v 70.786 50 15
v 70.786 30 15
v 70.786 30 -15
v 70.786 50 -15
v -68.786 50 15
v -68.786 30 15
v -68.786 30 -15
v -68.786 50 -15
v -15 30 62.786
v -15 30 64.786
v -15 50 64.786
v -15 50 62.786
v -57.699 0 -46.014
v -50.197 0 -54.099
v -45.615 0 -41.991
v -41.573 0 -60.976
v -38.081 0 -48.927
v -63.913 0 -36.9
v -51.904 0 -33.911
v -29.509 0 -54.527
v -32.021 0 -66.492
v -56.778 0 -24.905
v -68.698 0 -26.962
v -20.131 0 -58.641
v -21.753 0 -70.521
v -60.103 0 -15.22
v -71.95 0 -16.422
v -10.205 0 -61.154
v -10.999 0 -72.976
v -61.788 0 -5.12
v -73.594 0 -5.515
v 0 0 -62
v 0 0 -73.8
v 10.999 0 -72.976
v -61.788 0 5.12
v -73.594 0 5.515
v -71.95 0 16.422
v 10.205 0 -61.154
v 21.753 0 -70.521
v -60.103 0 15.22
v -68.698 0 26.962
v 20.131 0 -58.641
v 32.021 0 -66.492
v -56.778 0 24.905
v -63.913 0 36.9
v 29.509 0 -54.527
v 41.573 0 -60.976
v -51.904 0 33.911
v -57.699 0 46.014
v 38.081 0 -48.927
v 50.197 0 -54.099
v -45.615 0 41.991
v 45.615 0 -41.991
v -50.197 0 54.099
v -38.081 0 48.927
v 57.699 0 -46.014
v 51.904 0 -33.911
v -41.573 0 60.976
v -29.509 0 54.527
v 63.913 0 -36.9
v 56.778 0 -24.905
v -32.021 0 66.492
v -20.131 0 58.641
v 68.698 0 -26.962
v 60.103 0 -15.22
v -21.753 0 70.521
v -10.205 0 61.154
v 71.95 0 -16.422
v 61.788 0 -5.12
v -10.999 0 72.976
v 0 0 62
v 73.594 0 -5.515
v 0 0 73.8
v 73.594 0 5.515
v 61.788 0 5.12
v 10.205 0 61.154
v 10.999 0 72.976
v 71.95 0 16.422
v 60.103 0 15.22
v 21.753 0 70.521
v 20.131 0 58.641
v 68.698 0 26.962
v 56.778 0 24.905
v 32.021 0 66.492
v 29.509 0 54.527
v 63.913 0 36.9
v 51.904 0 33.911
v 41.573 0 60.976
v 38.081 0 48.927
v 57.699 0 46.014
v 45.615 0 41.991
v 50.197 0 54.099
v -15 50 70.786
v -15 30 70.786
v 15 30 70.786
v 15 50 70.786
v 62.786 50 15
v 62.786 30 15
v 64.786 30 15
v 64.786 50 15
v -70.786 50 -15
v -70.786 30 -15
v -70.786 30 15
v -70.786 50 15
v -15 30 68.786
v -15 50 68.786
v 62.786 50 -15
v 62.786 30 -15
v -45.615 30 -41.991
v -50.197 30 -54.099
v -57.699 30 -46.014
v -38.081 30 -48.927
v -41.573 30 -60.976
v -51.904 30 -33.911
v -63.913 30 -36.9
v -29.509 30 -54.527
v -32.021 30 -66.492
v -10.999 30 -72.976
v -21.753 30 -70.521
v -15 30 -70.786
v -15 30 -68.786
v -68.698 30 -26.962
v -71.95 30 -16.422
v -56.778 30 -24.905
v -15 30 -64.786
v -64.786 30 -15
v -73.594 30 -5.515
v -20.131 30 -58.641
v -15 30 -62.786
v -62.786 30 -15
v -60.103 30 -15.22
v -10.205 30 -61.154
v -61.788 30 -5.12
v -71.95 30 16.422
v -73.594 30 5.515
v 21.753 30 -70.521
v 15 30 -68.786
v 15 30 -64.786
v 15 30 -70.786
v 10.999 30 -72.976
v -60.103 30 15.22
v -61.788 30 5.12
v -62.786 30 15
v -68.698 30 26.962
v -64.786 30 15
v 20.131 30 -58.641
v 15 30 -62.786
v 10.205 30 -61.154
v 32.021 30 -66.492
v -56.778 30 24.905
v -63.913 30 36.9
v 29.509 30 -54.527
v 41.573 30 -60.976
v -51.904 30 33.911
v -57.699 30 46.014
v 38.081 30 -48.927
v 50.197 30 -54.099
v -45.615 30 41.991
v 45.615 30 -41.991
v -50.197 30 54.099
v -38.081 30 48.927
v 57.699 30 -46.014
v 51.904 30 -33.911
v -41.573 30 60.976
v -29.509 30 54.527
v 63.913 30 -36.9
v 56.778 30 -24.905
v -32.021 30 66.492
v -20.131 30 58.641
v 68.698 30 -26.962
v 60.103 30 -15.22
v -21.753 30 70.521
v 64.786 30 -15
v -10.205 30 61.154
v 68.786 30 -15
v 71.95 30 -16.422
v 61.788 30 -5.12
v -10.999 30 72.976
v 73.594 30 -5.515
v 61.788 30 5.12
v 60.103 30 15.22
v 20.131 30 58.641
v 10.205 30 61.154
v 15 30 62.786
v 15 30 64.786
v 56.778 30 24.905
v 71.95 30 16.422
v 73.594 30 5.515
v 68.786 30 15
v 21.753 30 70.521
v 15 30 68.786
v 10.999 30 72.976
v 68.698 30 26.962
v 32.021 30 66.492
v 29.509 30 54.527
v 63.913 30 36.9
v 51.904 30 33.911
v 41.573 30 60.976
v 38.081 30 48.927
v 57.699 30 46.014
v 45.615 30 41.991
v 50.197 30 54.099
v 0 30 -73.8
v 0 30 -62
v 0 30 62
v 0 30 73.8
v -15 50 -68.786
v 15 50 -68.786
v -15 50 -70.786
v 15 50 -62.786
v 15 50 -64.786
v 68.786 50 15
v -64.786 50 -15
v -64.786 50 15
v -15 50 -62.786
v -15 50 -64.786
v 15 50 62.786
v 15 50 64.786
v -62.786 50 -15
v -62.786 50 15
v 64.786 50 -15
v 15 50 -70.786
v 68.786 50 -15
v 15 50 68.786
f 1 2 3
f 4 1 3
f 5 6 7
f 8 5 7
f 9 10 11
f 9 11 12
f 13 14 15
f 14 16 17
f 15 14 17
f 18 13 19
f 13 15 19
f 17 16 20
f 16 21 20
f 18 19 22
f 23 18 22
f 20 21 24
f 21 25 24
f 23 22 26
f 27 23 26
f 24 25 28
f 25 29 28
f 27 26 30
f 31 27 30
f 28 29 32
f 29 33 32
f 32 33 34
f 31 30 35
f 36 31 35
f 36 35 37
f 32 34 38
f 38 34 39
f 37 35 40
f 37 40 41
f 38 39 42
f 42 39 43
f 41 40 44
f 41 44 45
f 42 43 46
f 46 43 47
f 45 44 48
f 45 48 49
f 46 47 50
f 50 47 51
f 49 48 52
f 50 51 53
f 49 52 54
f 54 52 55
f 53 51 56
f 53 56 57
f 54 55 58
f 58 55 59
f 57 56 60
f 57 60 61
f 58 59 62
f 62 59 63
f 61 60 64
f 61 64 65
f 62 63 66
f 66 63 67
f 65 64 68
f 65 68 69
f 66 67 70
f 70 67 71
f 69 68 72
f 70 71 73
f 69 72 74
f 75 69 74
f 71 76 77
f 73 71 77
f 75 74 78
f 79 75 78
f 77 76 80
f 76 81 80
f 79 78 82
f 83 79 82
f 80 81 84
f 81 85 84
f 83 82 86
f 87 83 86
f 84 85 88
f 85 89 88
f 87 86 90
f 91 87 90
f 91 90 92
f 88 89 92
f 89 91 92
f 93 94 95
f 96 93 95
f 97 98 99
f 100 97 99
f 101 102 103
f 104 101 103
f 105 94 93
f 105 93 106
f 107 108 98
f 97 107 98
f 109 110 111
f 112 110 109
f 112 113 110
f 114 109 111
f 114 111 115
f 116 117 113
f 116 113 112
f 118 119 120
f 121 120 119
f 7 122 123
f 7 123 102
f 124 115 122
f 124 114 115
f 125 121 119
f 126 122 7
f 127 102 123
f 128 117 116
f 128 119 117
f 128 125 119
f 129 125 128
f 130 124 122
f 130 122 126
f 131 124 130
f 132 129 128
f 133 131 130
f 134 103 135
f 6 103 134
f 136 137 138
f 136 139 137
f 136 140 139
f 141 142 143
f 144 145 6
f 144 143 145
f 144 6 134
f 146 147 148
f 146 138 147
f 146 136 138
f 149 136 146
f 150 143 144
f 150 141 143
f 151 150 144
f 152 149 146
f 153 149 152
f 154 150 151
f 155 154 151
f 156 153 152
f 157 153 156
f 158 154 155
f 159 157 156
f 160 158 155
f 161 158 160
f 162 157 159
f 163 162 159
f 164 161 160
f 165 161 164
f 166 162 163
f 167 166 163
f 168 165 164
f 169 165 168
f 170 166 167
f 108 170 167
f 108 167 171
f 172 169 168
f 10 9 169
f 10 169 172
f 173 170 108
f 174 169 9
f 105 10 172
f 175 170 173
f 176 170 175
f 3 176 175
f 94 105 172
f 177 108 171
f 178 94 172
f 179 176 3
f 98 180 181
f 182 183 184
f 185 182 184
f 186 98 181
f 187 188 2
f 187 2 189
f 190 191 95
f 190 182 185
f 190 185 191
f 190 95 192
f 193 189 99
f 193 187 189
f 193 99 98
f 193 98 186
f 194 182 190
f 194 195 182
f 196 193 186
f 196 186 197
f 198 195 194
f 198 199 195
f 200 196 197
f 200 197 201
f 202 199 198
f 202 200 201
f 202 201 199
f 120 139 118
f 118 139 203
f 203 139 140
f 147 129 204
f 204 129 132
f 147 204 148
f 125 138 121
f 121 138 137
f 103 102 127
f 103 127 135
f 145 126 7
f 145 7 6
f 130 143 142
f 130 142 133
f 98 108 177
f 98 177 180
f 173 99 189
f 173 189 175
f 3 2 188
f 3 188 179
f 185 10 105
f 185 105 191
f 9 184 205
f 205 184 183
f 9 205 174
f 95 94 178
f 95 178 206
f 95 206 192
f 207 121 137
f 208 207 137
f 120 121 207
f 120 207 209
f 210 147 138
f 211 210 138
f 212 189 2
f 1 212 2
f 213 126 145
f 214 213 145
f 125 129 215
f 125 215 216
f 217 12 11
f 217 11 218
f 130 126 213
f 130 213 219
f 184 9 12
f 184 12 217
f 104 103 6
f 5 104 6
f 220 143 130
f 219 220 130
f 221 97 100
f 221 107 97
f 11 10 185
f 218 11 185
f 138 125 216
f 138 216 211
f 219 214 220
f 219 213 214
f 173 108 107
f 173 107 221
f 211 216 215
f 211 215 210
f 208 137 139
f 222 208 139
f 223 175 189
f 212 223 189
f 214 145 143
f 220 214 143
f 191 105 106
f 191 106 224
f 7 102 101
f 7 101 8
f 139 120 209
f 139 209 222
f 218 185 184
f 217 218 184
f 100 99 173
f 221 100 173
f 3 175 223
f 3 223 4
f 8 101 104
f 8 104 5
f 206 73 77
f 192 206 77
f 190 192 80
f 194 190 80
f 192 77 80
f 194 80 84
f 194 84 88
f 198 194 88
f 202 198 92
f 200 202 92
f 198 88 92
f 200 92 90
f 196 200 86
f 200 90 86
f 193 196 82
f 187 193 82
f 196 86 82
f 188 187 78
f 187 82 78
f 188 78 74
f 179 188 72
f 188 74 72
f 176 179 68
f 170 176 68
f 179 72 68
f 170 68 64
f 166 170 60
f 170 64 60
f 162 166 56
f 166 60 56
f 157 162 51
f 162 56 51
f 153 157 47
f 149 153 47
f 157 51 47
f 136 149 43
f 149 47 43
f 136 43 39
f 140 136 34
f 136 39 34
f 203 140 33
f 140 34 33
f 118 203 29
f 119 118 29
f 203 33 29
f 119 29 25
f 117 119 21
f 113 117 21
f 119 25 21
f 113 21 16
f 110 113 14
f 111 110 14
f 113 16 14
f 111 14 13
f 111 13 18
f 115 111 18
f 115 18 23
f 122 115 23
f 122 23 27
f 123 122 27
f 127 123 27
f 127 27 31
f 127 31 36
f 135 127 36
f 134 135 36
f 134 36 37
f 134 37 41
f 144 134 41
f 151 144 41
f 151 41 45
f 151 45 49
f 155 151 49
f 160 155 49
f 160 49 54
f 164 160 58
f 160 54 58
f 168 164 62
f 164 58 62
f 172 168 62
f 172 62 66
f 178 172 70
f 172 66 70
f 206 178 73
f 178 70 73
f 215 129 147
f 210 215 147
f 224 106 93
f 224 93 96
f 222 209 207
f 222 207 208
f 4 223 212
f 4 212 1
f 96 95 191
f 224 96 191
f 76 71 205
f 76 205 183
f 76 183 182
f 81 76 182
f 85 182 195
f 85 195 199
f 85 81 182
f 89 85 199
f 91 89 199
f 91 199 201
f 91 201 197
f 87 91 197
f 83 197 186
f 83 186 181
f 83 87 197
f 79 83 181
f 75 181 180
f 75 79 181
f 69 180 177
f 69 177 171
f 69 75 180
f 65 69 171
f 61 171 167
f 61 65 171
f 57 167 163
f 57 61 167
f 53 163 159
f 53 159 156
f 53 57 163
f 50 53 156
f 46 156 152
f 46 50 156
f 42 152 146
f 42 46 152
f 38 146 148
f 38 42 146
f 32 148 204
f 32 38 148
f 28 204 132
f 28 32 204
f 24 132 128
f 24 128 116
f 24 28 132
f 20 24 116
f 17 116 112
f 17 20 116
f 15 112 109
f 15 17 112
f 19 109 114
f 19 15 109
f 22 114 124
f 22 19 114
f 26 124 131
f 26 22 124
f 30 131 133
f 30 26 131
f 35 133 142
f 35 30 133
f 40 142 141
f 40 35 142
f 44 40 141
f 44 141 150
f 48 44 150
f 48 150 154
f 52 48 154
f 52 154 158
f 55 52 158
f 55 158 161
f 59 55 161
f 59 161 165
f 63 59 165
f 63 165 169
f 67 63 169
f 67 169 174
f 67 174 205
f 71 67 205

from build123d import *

# Parameters (mm, degrees)
ESQUISSE1_R        = 73.8
ESQUISSE1_R_2      = 62
BOSS_EXTRU_1_DEPTH = 30
ESQUISSE2_W        = 2
ESQUISSE2_H        = 15
ESQUISSE2_W_2      = 30
ESQUISSE2_H_2      = 2
BOSS_EXTRU_2_DEPTH = 20


with BuildPart() as part:
    # Esquisse1 → Boss.-Extru.1 (new body)
    with BuildSketch(Plane(origin=(0, 0, 0), x_dir=(1, 0, 0), z_dir=(0, 1, 0))):
        with Locations(Location((0, 0, 0), (0, 0, 270))):
            Circle(ESQUISSE1_R)
        with Locations(Location((0, 0, 0), (0, 0, 270))):
            Circle(ESQUISSE1_R_2, mode=Mode.SUBTRACT)
    extrude(amount=BOSS_EXTRU_1_DEPTH)

    # Esquisse2 → Boss.-Extru.2 (add)
    with BuildSketch(Plane(origin=(0, 30, 0), x_dir=(1, 0, 0), z_dir=(0, 1, 0))):
        with Locations((-69.786402014, 7.5)):
            Rectangle(ESQUISSE2_W, ESQUISSE2_H)
        with Locations((-69.786402014, -7.5)):
            Rectangle(ESQUISSE2_W, ESQUISSE2_H)
        with Locations((-63.786402014, -7.5)):
            Rectangle(ESQUISSE2_W, ESQUISSE2_H)
        with Locations((-63.786402014, 7.5)):
            Rectangle(ESQUISSE2_W, ESQUISSE2_H)
        with Locations((0, 69.786402014)):
            Rectangle(ESQUISSE2_W_2, ESQUISSE2_H_2)
        with Locations((0, 63.786402014)):
            Rectangle(ESQUISSE2_W_2, ESQUISSE2_H_2)
        with Locations((63.786402014, -7.5)):
            Rectangle(ESQUISSE2_W, ESQUISSE2_H)
        with Locations((63.786402014, 7.5)):
            Rectangle(ESQUISSE2_W, ESQUISSE2_H)
        with Locations((69.786402014, 7.5)):
            Rectangle(ESQUISSE2_W, ESQUISSE2_H)
        with Locations((69.786402014, -7.5)):
            Rectangle(ESQUISSE2_W, ESQUISSE2_H)
        with Locations((0, -69.786402014)):
            Rectangle(ESQUISSE2_W_2, ESQUISSE2_H_2)
        with Locations((0, -63.786402014)):
            Rectangle(ESQUISSE2_W_2, ESQUISSE2_H_2)
    extrude(amount=BOSS_EXTRU_2_DEPTH)


solid = part.part
